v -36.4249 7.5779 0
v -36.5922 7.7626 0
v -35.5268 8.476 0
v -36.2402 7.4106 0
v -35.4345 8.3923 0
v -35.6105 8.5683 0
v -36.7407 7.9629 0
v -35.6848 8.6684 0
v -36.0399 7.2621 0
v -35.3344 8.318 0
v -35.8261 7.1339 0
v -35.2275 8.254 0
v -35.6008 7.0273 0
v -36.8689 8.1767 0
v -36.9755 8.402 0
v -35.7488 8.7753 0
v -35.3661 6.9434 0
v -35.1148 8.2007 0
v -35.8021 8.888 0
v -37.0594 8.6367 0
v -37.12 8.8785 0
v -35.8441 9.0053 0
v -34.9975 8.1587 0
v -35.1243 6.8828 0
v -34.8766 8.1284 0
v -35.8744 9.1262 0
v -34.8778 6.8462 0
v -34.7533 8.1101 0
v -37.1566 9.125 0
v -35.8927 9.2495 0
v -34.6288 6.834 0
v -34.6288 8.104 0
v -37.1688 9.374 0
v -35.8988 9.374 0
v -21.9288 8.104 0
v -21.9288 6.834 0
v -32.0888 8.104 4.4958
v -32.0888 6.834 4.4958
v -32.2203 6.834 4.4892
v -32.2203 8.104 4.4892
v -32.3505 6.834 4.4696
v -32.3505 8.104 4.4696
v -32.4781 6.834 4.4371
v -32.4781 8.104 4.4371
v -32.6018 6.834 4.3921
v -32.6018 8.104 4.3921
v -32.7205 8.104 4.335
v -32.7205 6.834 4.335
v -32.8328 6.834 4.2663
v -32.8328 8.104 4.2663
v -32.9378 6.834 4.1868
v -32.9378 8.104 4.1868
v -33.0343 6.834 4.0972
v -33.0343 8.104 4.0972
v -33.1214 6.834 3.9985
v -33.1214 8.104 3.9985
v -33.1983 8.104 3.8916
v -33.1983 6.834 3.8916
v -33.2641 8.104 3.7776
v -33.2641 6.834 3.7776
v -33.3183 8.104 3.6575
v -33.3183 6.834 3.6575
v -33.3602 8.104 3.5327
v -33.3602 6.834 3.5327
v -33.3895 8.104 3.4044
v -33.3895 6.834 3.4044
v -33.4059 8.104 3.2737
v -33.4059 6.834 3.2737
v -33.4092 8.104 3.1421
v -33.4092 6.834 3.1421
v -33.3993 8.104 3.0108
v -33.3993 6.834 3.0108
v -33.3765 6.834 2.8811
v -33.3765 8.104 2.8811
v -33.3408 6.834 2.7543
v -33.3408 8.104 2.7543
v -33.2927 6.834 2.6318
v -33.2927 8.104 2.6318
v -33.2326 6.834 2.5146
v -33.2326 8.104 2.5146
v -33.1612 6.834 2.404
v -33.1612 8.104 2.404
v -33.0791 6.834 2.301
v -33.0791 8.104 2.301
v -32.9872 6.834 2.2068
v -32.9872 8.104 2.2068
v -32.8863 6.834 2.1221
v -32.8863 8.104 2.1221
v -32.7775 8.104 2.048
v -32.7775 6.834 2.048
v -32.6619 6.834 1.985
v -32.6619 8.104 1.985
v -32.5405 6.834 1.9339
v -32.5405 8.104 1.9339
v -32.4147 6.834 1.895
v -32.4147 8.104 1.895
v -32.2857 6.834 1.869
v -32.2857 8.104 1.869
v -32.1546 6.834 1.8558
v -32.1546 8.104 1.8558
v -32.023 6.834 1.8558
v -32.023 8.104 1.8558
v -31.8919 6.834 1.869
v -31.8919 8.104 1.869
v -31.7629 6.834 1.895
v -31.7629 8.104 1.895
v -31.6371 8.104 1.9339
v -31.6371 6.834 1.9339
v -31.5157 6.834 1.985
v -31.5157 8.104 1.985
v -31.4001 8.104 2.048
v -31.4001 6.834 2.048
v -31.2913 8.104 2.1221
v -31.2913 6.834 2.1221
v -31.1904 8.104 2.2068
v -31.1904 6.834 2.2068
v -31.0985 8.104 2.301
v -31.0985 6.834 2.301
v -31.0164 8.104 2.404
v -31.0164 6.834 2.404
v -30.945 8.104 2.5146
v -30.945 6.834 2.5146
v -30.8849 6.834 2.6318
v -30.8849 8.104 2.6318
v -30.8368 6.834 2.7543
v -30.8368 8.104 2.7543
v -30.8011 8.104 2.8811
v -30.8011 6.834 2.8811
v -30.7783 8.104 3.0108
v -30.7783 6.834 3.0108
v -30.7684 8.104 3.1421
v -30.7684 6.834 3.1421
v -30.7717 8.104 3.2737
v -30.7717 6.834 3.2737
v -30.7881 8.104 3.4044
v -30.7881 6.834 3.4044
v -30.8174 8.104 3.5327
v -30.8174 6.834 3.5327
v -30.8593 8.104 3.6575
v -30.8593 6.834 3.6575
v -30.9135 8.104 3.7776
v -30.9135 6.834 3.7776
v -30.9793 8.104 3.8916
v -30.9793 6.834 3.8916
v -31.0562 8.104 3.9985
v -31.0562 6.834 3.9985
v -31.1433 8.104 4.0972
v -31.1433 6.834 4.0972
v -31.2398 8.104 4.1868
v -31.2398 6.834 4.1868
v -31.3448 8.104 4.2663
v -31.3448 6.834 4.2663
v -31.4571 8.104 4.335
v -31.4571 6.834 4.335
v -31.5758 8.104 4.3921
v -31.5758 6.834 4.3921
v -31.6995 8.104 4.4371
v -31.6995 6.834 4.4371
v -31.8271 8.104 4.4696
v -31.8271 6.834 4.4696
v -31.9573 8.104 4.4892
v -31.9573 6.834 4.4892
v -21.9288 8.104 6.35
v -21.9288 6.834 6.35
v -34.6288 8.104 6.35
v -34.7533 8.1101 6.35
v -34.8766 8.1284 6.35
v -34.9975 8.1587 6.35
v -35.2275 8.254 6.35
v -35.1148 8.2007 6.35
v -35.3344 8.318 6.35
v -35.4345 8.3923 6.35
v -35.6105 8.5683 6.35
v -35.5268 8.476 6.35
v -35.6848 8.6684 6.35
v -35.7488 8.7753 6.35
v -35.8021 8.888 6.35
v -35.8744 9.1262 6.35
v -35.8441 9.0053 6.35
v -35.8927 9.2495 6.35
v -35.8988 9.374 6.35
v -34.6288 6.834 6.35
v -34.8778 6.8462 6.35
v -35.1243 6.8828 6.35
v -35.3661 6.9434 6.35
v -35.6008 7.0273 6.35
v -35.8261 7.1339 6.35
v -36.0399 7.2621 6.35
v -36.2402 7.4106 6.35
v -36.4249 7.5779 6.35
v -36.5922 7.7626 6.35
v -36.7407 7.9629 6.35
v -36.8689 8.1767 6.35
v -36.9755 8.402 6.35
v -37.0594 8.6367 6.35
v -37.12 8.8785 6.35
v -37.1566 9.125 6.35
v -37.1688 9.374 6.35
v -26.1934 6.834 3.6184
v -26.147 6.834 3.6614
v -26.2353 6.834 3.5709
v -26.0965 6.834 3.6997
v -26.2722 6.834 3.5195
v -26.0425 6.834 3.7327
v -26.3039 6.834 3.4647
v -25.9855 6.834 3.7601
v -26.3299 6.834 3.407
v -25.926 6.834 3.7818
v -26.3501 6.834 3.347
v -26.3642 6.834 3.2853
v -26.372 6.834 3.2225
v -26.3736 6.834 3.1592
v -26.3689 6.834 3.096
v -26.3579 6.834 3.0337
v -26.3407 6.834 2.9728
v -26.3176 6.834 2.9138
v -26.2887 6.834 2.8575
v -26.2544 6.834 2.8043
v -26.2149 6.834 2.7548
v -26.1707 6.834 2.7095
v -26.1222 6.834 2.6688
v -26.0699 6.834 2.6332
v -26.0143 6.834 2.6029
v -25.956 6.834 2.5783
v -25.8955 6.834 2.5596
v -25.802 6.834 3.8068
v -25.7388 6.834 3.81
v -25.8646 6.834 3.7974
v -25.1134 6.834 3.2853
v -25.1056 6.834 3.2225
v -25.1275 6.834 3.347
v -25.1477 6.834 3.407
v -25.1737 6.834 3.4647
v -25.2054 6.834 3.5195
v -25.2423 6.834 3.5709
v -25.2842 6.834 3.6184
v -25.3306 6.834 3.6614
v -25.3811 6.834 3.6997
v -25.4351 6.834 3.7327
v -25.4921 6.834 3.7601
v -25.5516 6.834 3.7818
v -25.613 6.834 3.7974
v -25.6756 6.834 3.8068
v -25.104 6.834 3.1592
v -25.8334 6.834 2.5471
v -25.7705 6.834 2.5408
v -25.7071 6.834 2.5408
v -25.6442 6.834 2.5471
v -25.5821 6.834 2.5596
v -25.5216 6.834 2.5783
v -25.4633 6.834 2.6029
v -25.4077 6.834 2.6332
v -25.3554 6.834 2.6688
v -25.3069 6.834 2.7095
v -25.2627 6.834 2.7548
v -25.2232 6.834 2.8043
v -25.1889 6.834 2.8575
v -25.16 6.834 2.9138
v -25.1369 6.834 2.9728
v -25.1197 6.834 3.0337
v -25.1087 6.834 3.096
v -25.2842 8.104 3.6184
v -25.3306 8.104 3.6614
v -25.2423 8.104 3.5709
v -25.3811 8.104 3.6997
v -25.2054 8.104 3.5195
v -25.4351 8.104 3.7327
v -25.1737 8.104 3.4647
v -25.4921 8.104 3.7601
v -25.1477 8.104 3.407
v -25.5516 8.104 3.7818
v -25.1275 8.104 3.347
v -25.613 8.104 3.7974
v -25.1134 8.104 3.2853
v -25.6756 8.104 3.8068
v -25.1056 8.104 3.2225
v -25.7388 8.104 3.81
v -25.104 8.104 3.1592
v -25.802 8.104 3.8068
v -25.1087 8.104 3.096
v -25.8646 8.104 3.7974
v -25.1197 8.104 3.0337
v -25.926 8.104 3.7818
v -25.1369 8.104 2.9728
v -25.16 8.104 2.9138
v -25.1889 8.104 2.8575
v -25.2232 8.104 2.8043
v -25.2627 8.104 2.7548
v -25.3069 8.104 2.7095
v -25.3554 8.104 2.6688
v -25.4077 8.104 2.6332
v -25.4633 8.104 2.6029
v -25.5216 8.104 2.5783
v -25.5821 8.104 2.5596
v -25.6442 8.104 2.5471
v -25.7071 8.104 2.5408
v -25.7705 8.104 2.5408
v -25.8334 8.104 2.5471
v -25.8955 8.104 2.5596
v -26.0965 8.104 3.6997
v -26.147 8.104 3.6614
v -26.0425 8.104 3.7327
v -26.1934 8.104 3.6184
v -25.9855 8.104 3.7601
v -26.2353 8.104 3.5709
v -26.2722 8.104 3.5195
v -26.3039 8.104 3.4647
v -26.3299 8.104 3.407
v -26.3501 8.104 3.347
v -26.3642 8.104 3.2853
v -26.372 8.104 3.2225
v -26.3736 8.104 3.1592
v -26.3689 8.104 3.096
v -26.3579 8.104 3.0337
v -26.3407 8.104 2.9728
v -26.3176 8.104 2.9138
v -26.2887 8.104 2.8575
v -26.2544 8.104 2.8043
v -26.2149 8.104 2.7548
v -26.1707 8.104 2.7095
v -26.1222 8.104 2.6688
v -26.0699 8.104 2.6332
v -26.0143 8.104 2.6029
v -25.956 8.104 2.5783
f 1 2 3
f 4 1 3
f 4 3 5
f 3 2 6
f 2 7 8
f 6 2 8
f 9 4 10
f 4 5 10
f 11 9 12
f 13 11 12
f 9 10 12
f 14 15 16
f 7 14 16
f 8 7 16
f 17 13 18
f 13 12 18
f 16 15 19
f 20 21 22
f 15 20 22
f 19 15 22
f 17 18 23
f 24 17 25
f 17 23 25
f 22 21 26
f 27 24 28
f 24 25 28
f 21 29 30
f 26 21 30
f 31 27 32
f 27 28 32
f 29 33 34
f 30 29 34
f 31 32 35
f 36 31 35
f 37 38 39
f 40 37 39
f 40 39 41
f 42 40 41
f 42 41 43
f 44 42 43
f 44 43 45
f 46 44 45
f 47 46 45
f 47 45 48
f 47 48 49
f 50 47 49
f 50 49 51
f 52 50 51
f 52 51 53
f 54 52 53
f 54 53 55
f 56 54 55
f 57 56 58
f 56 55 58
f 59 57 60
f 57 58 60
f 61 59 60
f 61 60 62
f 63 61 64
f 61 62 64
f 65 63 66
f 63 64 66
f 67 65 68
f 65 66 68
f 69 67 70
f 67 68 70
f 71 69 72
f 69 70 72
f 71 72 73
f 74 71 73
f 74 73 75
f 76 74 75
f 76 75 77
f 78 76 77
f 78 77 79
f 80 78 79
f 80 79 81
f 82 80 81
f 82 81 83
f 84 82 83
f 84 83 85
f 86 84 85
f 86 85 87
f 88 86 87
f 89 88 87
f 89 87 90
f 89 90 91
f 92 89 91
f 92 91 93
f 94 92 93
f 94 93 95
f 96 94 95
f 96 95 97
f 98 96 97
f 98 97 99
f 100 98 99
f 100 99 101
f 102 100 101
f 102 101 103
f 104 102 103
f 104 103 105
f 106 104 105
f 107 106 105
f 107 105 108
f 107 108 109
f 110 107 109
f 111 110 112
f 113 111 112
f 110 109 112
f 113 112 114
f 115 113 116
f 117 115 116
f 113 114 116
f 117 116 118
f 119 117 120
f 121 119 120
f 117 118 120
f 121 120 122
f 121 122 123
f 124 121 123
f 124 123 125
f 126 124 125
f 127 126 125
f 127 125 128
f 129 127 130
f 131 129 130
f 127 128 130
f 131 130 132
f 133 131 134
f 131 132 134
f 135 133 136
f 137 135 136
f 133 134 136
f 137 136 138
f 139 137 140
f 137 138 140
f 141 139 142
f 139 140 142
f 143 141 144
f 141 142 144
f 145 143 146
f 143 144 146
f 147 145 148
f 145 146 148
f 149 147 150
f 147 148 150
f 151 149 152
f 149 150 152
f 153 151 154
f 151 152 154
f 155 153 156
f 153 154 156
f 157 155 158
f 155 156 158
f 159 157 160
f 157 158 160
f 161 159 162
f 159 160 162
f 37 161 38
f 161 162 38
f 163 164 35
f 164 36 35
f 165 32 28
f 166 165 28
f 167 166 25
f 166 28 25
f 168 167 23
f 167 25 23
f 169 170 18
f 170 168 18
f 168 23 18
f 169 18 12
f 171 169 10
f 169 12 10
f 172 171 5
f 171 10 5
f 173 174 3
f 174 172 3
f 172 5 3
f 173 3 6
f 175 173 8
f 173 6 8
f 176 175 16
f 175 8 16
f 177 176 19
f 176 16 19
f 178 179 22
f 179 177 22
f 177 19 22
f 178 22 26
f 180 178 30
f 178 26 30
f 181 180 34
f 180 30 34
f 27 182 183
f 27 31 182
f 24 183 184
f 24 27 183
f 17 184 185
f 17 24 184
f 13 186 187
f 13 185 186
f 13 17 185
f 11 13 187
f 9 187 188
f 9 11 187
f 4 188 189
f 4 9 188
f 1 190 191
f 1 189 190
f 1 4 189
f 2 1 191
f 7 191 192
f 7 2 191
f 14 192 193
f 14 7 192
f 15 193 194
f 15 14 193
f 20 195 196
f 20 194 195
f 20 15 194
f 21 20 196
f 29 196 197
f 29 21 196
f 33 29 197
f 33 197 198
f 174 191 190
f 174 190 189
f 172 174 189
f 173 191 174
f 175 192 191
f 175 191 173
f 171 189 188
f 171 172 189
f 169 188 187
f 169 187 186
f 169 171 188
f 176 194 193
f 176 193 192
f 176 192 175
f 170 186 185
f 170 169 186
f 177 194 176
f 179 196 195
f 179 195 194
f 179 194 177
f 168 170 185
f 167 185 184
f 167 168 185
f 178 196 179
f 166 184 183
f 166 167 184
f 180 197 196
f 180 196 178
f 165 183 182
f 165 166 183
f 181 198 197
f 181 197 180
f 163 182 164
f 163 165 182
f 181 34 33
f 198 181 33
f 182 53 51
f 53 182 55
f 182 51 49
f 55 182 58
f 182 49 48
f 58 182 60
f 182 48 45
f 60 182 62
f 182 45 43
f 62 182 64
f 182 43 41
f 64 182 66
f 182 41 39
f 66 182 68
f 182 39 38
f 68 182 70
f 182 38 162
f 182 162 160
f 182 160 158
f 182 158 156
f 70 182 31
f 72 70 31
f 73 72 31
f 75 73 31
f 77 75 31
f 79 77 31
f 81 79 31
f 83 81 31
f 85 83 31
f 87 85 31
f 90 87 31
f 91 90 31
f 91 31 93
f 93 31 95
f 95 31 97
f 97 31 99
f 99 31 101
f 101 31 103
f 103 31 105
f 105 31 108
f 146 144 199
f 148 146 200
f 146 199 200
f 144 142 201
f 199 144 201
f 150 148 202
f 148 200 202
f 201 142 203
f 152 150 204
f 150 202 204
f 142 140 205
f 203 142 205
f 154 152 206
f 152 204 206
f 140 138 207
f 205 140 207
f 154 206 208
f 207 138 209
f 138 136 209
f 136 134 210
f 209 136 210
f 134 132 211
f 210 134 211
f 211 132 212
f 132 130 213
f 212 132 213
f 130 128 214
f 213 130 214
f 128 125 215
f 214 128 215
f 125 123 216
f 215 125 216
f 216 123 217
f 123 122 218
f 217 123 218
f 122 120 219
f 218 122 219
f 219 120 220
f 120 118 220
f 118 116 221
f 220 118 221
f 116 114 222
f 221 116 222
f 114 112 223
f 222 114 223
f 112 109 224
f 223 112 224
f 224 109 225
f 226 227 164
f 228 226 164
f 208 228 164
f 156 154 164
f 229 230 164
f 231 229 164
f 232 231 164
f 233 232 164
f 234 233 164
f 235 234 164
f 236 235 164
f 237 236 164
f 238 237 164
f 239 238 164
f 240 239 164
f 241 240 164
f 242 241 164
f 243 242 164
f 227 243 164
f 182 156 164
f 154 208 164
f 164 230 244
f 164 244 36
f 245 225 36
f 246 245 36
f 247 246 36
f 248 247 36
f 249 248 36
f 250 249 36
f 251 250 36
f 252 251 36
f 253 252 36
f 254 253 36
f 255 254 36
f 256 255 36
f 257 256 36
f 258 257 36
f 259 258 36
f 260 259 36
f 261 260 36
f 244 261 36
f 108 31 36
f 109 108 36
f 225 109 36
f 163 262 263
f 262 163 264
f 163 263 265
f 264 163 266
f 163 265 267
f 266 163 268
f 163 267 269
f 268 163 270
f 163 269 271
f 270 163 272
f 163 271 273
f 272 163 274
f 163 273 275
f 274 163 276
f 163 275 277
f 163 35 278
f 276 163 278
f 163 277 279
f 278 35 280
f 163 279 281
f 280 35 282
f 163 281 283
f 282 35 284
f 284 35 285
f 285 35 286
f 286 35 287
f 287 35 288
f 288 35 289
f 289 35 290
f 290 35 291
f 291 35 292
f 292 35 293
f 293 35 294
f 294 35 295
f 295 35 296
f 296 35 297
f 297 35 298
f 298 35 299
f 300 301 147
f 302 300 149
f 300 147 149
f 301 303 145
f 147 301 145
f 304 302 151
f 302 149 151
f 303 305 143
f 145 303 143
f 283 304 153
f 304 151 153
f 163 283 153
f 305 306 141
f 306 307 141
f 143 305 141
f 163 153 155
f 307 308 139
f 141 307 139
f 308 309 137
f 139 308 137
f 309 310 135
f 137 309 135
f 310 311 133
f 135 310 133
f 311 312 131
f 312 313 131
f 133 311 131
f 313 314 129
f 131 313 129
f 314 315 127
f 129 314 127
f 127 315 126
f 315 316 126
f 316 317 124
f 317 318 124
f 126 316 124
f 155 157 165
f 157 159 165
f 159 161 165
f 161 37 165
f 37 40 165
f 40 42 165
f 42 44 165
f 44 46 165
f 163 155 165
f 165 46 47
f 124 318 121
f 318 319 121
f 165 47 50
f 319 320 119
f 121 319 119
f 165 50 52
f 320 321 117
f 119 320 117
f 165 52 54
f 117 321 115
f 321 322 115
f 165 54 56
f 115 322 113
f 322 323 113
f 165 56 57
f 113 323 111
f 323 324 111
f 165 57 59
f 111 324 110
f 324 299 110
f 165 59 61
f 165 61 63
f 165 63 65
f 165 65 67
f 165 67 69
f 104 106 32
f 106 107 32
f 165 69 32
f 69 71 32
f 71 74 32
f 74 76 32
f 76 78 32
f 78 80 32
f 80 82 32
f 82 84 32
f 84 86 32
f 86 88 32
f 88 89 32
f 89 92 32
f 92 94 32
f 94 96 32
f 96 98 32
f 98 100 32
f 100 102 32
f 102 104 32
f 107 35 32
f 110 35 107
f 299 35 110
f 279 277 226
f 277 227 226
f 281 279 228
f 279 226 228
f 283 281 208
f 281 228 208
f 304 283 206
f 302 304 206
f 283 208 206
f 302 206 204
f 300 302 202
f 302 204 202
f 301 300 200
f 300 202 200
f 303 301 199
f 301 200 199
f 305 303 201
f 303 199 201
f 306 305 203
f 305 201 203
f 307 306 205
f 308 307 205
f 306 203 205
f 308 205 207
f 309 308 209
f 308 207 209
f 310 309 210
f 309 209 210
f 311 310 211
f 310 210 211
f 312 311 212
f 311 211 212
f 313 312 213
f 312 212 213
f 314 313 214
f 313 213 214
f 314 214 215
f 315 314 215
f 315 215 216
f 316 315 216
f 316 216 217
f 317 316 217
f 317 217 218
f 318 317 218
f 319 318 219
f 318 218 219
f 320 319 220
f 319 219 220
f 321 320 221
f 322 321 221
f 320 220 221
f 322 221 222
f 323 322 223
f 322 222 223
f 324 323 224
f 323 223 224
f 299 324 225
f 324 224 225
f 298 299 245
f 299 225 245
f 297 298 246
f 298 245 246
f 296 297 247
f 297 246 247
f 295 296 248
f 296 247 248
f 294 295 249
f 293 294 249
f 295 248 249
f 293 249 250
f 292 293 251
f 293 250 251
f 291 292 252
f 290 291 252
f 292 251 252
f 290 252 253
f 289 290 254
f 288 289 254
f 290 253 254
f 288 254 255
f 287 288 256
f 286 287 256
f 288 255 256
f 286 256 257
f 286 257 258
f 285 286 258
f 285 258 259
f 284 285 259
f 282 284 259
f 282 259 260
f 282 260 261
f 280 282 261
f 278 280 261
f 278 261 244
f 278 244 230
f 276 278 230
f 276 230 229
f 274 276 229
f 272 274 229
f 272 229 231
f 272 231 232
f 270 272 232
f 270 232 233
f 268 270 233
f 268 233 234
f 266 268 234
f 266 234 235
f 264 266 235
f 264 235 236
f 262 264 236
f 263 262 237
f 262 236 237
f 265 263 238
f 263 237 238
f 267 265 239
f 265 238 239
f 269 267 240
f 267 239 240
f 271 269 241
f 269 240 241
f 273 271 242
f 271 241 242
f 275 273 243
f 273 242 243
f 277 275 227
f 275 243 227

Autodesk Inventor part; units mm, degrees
ref_plane "YZ Plane" through (0, 0, 0) normal (1, 0, 0) x (0, 1, 0)
ref_plane "XZ Plane" through (0, 0, 0) normal (0, 1, 0) x (-1, 0, 0)
ref_plane "XY Plane" through (0, 0, 0) normal (0, 0, 1) x (1, 0, 0)
sketch "Sketch1" plane through (0, 0, 0) normal (0, 0, 1) x (1, 0, 0)
  line L0 (-37.1688, 9.374) -> (-37.1688, 9.374)
  line L1 (-34.6288, 6.834) -> (-21.9288, 6.834)
  line L2 (-21.9288, 6.834) -> (-21.9288, 8.104)
  line L3 (-21.9288, 8.104) -> (-34.6288, 8.104)
  line L4 (-35.8988, 9.374) -> (-35.8988, 9.374)
  line L5 (-35.8988, 9.374) -> (-37.1688, 9.374)
  arc A0 (-35.8988, 9.374) -> (-34.6288, 8.104) centre (-34.6288, 9.374) ccw
  arc A1 (-37.1688, 9.374) -> (-34.6288, 6.834) centre (-34.6288, 9.374) ccw
  dimension "d0" = 1.27
  dimension "d1" = 1.27
  dimension "d2" = 2.54
  dimension "d3" = 1.27
  dimension "d4" = 15.24
  dimension "d5" = 2.54
extrude "Extrusion1" add sketch "Sketch1" along normal blind 6.35
sketch "Sketch2" plane through (-34.6288, 8.104, 0) normal (0, 1, 0) x (1, 0, 0)
  line L0 (0, -6.35) -> (12.7, -6.35) projected
  line L1 (0, 0) -> (12.7, 0) projected
  circle A0 centre (2.54, -3.175) radius 3.175 construction
  dimension "d8" = 10.16
hole "Hole1" at (-32.0888, 8.104, 3.175) at (-32.0888, 8.104, 3.175) direction (0, -1, 0) diameter 2.6416 end through all thread size "6-32 UNC" class "2B" standard "ANSI Unified Screw Threads"
sketch "Sketch3" plane through (-34.6288, 8.104, 0) normal (0, 1, 0) x (1, 0, 0)
  circle A0 centre (2.54, -3.175) radius 1.3208 projected
  point P0 (8.89, -3.175)
  dimension "d16" = 6.35
hole "Hole2" at (-25.7388, 8.104, 3.175) direction (0, -1, 0) diameter 1.27 end through all
properties part number "contact" material "Brass, Soft Yellow"
